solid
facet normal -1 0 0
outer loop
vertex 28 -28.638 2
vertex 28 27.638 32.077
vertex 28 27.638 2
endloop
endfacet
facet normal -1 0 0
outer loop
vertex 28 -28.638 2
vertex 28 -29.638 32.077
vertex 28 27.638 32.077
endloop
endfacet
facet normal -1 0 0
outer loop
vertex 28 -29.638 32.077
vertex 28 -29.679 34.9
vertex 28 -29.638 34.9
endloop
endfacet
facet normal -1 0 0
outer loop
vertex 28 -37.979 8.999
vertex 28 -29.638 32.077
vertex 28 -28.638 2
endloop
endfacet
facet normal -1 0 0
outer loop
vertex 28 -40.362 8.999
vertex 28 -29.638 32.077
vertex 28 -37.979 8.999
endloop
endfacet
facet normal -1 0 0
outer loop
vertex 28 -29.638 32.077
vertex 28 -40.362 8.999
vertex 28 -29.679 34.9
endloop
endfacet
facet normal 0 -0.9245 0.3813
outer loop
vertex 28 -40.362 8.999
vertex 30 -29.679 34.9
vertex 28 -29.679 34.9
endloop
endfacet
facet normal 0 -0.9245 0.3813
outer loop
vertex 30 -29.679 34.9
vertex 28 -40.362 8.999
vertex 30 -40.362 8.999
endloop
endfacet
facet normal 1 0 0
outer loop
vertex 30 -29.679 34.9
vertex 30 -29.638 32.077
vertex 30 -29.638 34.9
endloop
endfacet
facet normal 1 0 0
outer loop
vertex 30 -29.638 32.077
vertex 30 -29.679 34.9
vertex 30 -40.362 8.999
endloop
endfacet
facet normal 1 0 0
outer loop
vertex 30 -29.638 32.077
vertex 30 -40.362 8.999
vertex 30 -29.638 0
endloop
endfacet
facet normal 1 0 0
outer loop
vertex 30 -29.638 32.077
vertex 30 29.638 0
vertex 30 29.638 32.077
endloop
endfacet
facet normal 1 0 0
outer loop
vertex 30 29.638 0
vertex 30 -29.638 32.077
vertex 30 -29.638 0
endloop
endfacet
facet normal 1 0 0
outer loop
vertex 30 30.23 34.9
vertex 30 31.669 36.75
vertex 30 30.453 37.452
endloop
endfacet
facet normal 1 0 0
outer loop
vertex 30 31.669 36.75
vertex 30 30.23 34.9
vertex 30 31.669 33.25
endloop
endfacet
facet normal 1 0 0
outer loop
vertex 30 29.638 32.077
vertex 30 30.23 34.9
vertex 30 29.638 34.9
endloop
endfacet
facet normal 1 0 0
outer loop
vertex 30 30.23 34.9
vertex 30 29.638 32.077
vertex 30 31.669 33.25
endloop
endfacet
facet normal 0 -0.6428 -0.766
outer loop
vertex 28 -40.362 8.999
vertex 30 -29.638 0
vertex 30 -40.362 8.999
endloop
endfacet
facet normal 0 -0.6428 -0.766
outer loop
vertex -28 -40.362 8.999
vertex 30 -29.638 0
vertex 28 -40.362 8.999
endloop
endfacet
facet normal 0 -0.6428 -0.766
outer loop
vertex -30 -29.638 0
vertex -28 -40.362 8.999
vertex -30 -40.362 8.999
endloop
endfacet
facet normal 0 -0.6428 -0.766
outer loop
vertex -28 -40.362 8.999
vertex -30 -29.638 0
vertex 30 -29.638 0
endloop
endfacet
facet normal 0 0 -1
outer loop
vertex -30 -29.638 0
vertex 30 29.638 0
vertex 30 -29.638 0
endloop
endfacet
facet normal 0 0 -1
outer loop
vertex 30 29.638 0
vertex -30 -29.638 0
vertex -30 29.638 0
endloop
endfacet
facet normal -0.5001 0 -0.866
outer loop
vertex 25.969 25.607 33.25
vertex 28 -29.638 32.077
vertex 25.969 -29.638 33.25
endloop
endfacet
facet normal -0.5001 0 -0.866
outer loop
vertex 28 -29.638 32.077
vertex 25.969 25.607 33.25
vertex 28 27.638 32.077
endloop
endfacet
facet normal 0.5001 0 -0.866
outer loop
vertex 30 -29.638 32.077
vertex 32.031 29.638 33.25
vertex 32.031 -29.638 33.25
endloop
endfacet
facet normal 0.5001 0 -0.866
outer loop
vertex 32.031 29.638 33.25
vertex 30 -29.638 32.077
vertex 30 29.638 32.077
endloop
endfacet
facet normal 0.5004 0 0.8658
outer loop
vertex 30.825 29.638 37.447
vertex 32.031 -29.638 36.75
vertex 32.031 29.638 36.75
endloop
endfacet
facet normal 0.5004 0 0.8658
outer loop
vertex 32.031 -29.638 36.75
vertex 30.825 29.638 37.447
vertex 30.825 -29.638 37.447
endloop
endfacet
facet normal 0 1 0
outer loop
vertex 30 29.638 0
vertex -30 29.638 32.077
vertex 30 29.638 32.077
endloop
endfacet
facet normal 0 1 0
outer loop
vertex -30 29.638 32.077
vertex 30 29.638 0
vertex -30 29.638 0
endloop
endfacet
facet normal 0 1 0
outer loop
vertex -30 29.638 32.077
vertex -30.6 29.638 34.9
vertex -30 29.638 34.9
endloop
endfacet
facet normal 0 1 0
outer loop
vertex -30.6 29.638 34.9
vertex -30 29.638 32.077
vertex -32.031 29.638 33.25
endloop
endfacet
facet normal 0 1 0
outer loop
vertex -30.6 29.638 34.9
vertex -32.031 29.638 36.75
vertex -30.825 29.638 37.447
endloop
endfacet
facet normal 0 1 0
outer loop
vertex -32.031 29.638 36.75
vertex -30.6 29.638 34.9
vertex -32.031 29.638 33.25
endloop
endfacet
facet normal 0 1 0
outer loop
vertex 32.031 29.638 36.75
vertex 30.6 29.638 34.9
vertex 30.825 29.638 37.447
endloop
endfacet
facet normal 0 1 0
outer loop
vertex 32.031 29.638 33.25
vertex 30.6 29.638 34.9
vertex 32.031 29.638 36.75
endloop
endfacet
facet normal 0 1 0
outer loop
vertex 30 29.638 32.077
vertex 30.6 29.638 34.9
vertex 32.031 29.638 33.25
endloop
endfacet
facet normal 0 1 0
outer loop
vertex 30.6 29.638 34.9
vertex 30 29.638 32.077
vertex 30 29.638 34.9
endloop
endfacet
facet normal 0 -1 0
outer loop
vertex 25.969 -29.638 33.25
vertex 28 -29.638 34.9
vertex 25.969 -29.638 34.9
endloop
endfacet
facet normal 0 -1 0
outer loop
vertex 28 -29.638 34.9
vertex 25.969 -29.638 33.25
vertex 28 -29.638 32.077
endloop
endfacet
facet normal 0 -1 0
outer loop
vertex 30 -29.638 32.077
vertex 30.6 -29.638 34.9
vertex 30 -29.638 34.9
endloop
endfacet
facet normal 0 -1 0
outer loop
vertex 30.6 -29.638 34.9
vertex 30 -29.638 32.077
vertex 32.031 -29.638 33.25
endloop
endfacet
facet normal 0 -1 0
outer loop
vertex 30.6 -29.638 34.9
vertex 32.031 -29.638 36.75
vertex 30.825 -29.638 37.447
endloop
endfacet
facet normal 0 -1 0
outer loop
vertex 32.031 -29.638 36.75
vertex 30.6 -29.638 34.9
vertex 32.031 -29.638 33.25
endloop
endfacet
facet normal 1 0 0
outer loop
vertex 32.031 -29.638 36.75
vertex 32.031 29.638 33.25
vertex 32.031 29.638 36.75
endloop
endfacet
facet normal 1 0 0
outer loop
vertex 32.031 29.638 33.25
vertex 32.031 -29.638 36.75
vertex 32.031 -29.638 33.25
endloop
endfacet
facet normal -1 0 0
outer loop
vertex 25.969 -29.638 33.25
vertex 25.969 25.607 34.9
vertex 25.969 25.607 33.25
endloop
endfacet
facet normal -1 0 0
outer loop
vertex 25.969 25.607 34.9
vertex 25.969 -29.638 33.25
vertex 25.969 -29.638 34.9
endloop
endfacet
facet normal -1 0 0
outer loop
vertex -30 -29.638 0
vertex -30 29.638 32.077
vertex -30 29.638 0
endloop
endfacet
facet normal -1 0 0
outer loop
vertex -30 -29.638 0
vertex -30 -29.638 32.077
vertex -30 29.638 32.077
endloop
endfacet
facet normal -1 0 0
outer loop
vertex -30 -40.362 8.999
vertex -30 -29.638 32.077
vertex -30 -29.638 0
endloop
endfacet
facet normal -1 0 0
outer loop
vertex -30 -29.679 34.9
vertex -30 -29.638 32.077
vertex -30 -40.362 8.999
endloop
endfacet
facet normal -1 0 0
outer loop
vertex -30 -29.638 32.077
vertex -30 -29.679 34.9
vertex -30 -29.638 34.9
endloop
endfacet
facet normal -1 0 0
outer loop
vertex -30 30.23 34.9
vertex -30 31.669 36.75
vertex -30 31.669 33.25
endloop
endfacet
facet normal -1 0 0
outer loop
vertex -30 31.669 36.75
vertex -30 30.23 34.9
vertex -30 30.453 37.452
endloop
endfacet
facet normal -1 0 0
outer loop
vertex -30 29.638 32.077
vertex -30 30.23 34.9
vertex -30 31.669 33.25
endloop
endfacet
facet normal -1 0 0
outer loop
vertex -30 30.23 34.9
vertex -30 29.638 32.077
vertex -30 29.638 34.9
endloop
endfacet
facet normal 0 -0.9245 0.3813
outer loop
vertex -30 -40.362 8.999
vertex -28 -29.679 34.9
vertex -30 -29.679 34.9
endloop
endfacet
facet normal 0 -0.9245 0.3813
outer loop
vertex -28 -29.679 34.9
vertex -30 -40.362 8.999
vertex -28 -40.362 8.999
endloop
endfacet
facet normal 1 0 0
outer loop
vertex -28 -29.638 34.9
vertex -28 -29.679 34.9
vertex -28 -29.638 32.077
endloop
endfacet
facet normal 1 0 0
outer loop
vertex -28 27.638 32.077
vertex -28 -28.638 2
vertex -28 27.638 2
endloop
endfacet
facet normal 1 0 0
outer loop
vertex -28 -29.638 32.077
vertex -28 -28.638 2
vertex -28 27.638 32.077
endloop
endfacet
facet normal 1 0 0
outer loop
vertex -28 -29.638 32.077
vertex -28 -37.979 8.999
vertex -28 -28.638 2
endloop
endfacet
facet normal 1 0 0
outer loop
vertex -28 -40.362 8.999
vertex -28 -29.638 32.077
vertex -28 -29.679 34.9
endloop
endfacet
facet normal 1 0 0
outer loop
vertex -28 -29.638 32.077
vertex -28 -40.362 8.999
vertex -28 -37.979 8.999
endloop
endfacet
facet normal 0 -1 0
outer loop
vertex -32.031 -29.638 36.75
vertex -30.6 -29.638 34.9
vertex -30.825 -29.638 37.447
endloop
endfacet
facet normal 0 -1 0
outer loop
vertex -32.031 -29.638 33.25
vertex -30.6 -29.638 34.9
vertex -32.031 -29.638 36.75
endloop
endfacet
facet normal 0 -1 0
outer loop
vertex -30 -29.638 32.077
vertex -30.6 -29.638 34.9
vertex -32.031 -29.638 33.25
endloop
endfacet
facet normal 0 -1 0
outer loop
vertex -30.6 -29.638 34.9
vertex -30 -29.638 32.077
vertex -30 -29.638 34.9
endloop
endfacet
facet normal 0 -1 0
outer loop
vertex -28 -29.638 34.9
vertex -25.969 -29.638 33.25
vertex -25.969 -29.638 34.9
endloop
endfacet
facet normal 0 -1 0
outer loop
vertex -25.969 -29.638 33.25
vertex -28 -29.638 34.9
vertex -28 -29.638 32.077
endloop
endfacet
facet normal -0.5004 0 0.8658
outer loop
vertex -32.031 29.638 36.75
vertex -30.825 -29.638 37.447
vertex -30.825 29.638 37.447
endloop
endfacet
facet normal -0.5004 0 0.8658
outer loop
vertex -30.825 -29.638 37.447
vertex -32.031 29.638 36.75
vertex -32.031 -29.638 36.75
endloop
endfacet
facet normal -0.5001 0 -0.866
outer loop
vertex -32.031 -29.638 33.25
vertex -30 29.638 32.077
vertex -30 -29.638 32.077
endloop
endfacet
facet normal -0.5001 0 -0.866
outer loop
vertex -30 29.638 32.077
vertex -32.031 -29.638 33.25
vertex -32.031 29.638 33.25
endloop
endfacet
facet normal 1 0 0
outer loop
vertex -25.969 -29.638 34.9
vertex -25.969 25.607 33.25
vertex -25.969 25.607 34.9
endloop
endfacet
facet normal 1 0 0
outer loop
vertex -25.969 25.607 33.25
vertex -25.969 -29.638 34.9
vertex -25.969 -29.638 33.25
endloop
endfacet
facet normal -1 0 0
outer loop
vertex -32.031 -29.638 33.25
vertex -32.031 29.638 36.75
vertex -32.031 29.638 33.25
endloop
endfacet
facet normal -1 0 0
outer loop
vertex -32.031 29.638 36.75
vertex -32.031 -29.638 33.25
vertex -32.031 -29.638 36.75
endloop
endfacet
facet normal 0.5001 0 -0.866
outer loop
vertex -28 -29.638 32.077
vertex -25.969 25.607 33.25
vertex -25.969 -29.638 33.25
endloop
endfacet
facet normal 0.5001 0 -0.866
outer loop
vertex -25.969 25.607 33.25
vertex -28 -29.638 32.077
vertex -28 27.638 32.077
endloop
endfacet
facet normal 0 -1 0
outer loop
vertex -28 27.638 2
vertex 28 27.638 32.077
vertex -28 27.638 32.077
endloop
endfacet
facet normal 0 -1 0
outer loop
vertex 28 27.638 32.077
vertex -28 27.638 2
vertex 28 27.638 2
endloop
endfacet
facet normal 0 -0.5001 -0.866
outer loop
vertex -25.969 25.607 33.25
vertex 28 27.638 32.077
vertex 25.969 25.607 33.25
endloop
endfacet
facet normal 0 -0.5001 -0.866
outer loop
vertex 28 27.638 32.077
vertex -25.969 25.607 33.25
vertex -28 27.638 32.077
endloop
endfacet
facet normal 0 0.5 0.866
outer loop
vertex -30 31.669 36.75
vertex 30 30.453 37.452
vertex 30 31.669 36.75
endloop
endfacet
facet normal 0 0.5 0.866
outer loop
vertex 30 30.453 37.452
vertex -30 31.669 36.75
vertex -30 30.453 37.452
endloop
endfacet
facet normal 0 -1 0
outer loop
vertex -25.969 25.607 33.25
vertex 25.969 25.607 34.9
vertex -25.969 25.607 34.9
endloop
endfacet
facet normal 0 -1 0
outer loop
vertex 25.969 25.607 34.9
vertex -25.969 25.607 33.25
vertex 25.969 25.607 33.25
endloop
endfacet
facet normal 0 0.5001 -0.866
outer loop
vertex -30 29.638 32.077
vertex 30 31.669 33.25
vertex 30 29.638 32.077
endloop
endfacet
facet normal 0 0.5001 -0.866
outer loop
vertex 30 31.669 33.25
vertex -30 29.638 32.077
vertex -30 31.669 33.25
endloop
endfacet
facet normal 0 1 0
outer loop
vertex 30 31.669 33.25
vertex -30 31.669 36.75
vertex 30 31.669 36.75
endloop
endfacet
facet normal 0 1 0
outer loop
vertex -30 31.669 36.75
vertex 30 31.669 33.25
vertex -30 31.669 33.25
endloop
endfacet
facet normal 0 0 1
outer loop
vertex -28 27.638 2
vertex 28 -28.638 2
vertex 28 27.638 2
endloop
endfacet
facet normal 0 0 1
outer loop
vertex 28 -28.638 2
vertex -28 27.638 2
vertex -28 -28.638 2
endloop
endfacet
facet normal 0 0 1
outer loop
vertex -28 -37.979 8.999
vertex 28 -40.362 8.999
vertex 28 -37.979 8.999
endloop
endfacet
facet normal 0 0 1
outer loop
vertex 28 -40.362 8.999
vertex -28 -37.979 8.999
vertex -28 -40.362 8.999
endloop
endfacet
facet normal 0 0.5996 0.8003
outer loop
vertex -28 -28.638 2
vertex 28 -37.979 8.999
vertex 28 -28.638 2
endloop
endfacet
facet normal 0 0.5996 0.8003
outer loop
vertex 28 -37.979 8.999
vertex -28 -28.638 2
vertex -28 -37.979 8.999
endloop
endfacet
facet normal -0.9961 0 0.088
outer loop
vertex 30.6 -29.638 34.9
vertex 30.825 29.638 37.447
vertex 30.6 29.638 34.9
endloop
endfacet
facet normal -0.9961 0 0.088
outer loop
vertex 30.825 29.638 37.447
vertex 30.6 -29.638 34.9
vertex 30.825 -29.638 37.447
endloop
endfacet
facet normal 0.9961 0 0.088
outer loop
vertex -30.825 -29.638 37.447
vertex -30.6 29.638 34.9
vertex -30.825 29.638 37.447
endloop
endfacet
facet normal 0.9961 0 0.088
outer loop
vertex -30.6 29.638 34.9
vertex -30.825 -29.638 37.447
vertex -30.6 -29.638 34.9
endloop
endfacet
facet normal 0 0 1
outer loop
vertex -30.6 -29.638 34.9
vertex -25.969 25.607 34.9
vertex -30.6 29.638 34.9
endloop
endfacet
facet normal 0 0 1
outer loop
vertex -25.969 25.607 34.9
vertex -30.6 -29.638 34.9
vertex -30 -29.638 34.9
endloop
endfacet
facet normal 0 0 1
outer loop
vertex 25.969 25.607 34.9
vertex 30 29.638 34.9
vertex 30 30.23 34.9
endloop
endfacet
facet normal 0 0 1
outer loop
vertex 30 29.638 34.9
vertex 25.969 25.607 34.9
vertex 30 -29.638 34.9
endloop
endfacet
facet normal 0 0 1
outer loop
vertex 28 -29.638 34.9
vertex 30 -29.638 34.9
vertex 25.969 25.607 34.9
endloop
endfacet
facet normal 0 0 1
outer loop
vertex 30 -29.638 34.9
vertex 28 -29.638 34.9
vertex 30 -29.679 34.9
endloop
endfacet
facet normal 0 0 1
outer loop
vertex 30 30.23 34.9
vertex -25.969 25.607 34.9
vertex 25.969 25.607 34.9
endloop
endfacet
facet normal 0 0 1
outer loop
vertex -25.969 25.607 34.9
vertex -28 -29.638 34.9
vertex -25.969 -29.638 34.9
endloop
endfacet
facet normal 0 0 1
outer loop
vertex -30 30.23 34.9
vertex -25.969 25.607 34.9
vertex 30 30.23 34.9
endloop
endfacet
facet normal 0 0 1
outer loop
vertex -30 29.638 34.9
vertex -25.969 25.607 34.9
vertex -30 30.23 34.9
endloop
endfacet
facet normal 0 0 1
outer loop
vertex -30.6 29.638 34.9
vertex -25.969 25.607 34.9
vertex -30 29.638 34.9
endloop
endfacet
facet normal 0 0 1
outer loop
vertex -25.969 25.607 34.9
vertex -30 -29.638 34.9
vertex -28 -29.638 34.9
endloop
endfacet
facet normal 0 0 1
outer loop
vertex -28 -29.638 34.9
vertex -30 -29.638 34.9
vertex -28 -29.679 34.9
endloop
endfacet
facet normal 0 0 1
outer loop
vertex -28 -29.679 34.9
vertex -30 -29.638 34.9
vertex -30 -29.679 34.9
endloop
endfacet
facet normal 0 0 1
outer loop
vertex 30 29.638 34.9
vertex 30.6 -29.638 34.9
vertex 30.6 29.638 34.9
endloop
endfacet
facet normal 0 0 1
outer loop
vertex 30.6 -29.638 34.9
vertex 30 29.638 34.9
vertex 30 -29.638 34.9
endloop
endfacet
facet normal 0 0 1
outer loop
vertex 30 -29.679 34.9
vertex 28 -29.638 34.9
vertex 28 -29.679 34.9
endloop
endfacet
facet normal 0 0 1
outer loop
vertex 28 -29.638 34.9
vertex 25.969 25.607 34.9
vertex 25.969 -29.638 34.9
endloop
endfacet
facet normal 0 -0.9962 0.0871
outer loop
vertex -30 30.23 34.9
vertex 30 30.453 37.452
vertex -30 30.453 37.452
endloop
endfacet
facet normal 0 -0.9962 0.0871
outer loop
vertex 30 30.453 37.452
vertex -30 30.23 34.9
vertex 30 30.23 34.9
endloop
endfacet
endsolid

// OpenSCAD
//	Thingiverse Customizer Template v1.2 by MakerBlock
//	http://www.thingiverse.com/thing:44090
//	v1.2 now includes the Build Plate library as well

//	Uncomment the library/libraries of your choice to include them
//	include <MCAD/filename.scad>
//	include <pins/pins.scad>
//	include <write/Write.scad>
//	include <utils/build_plate.scad>

//CUSTOMIZER VARIABLES

box_width=60;
box_depth=70;
box_height=35;
//thickness of box wall
thick=2;
//front side wall angle(degree)
angle=40;
//length of front side wall - ratio to box depth
front_side_wall_length_ratio = .40;
//thickness of front wall
front_thick=8;

//How wide the stack guide is
stack_guide_width_ratio=3.5;
//Stack guide - number of face
stack_guide_fn=6;

//CUSTOMIZER VARIABLES END

//should not be displayed in option
size=[box_width,box_depth,box_height]*1;
drawer_len=size[2]*front_side_wall_length_ratio;
drawer_height=drawer_len*sin(angle);
drawer_depth =drawer_len*cos(angle);
floor_size=[size[0],size[1]-drawer_depth,thick]*1;
stack_guide_w=thick*3.5;


//currently not used option
top_depth_ratio=.1*1;
top_depth=0*1;


module center_xy_cube(v){
    translate([-v[0]/2,-v[1]/2,0]) cube(v);
}

module side_wall(x){
    x2 = x > 0 ? x-thick/2 : x+thick/2;
    translate([x2,0,0])
    rotate([90,0,90])
    translate([-floor_size[1]/2,0,-thick/2])
    linear_extrude(height=thick)
    polygon([ [0,0], [floor_size[1],0], [floor_size[1],size[2]],
		[top_depth,size[2]],
		[-drawer_depth,drawer_height] ]);

    translate([x2,floor_size[1]/2,size[2]]) rotate([90,30,0]) cylinder(r=stack_guide_w/2, h=floor_size[1]-top_depth, $fn=stack_guide_fn);
	
}
module front_wall(){
    rotate([90,0,90])
    translate([-floor_size[1]/2,0,-size[0]/2])
    linear_extrude(height=size[0])
    polygon([
	    [0,0],
	    [1,thick],
	    [-drawer_depth+thick*tan(90-angle),drawer_height],
	    [-drawer_depth,drawer_height]
	    ]);
}

module back_wall(){
    translate( [0,floor_size[1]/2-thick/2,0] ) center_xy_cube([size[0],thick,size[2]]);
    translate( [-size[0]/2,floor_size[1]/2-thick/2,size[2]] ) rotate([00,90,00]) cylinder(r=stack_guide_w/2, h=size[0], $fn=stack_guide_fn);
}


module box(){
    center_xy_cube(floor_size);
    for( x = [size[0]/2,-size[0]/2] ){
	side_wall(x);
    }
    front_wall();
    back_wall();
}

difference( ){
    box();
    hull(){
	translate([0,0,size[2]-.1]) center_xy_cube(floor_size*1.02);
	translate([0,0,size[2]-.2+stack_guide_w/2]) center_xy_cube(floor_size*1.03);
    }
}
